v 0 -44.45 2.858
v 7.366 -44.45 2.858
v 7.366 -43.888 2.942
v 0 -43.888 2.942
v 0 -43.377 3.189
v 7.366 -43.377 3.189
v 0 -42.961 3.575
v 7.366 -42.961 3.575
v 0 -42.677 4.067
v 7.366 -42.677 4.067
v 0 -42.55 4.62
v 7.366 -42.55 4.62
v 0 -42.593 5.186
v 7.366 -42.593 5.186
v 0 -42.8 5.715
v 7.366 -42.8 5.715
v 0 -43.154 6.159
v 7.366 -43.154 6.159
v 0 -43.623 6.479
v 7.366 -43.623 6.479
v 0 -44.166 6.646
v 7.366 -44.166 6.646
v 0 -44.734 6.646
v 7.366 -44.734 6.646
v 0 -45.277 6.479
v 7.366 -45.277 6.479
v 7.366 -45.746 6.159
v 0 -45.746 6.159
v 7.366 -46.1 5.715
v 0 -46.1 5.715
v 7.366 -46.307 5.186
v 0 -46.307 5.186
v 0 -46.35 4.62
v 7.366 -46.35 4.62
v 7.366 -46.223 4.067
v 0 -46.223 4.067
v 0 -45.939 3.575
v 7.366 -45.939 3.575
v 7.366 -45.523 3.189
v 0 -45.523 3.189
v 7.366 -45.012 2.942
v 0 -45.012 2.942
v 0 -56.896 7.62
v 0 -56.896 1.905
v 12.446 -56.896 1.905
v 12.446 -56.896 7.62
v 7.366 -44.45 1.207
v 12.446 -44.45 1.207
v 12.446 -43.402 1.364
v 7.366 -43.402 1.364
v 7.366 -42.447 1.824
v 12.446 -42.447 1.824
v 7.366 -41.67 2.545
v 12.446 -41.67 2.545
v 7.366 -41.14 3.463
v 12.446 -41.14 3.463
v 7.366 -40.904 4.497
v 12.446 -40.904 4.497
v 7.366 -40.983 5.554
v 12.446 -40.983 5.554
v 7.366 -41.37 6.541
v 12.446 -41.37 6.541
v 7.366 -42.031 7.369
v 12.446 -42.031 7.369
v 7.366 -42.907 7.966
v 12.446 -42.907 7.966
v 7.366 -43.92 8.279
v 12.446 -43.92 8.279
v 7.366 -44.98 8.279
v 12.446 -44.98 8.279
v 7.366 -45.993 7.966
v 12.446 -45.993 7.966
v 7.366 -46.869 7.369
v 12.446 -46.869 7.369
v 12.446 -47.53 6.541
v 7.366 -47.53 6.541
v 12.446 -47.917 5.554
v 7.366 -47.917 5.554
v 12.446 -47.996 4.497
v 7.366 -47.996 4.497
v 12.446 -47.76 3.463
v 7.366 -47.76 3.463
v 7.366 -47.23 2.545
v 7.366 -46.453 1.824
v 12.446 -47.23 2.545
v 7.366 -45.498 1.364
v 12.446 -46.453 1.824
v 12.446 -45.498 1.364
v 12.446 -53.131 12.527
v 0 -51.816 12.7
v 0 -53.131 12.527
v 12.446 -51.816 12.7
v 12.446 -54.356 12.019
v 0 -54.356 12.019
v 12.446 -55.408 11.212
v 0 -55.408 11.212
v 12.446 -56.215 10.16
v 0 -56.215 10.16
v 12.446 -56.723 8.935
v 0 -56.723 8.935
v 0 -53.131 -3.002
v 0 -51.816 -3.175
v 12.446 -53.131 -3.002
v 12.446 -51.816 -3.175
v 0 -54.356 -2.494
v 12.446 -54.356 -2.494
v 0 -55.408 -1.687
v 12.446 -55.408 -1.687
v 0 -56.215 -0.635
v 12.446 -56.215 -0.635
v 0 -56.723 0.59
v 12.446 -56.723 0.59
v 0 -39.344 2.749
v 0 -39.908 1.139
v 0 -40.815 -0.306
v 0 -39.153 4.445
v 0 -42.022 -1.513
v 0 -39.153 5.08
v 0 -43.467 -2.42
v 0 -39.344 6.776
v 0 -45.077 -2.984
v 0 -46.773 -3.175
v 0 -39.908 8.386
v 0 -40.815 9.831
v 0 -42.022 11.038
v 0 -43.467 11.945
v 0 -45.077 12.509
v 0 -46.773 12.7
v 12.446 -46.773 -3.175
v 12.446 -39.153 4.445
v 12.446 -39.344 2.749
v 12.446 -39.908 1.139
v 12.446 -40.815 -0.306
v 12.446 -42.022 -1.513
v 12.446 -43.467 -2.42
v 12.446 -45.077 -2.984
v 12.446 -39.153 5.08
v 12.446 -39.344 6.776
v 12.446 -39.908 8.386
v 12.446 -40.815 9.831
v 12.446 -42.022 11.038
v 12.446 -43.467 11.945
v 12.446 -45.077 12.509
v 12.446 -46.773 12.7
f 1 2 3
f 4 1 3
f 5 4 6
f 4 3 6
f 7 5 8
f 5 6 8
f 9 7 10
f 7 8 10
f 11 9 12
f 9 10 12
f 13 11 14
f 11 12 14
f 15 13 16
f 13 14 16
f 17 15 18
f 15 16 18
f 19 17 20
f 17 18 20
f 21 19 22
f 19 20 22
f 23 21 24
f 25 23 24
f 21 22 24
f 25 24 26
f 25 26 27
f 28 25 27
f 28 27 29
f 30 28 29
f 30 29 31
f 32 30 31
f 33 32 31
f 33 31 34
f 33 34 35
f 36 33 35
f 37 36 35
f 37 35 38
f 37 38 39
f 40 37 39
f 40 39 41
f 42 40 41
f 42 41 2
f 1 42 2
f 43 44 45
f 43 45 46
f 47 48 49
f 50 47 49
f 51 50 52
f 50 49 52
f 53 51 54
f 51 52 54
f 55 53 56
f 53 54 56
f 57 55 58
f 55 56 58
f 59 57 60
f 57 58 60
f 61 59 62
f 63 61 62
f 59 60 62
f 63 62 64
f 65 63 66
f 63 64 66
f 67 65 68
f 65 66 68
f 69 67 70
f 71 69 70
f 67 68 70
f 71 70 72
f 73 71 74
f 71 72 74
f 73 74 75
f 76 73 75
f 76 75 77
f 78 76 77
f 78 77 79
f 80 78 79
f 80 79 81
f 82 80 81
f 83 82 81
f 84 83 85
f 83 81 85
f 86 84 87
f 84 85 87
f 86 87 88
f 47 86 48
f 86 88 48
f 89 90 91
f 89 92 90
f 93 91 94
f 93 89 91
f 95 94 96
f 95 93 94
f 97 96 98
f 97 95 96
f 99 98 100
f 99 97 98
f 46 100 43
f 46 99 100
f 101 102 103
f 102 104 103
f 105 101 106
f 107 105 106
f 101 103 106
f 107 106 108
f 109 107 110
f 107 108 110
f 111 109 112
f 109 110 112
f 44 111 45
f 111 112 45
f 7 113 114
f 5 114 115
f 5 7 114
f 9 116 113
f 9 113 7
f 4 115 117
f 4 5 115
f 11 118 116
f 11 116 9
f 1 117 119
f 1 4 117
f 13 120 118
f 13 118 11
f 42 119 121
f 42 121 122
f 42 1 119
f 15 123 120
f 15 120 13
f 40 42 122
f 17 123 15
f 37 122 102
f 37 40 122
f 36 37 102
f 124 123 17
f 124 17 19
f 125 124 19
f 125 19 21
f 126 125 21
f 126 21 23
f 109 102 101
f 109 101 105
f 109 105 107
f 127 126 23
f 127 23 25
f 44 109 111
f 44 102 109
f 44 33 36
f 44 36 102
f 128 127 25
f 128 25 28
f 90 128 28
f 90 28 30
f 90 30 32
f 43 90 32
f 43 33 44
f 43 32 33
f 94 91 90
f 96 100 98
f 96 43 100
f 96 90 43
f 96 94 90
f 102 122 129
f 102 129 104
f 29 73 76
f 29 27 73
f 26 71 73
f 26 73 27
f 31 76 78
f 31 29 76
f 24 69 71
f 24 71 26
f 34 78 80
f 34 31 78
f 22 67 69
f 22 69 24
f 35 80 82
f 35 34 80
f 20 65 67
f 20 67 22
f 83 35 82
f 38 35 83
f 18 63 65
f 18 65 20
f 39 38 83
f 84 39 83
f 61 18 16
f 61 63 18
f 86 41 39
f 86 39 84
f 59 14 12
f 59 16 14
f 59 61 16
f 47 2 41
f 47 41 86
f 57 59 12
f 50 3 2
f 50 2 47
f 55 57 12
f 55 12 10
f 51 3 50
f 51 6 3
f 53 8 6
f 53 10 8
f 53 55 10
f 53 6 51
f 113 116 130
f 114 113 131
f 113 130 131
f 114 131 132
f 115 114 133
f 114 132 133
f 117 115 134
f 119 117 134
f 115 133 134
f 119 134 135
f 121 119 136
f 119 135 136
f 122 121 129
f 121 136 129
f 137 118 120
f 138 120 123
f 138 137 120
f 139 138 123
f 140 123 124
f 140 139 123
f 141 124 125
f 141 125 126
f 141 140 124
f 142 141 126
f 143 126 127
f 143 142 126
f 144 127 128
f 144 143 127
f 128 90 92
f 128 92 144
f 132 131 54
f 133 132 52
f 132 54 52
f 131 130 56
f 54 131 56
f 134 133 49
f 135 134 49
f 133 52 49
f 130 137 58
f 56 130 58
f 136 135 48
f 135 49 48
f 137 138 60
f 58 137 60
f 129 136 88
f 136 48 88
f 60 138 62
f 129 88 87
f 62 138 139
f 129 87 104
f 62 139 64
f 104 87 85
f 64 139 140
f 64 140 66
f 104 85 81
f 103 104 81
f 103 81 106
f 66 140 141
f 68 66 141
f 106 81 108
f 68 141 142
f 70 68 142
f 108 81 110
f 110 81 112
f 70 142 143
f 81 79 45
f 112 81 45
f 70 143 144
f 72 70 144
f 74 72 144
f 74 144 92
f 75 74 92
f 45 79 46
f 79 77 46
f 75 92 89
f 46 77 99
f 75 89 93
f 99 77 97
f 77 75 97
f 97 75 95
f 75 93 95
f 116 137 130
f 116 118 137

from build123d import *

# Parameters (mm, degrees)
SKETCH1_W           = 50.8
SKETCH1_H           = 9.525
BOSS_EXTRUDE1_DEPTH = 12.446
SKETCH6_R           = 1.905
CUT_EXTRUDE4_DEPTH  = 12.446
SKETCH7_R           = 3.556
CUT_EXTRUDE5_DEPTH  = 5.08
SKETCH8_W           = 38.1
SKETCH8_H           = 9.525
CUT_EXTRUDE6_DEPTH  = 12.446
FILLET2_R           = 2.54
CUT_EXTRUDE7_START  = -12.446
CUT_EXTRUDE7_DEPTH  = 12.446
FILLET4_R           = 5.08
SKETCH11_W          = 12.446
SKETCH11_H          = 9.525
BOSS_EXTRUDE2_DEPTH = 6.35
CUT_EXTRUDE8_START  = -12.446
SKETCH12_W          = 0.254
SKETCH12_H          = 9.525
CUT_EXTRUDE8_DEPTH  = 12.446
CUT_EXTRUDE9_START  = -12.446
CUT_EXTRUDE9_DEPTH  = 12.446
BOSS_EXTRUDE3_START = -12.446
BOSS_EXTRUDE3_DEPTH = 12.446
FILLET6_R           = 7.62
FILLET7_R           = 5.08


with BuildPart() as part:
    # Sketch1 → Boss-Extrude1 (new body)
    with BuildSketch(Plane.YZ):
        with Locations((-25.4, 4.7625)):
            Rectangle(SKETCH1_W, SKETCH1_H)
    extrude(amount=BOSS_EXTRUDE1_DEPTH)

    # Sketch6 → Cut-Extrude4 (cut)
    with BuildSketch(Plane.YZ.offset(12.446)):
        with Locations(Location((-44.45, 4.7625, 0), (0, 0, 270))):
            Circle(SKETCH6_R)
    extrude(amount=-CUT_EXTRUDE4_DEPTH, mode=Mode.SUBTRACT)

    # Sketch7 → Cut-Extrude5 (cut)
    with BuildSketch(Plane.YZ.offset(12.446)):
        with Locations(Location((-44.45, 4.7625, 0), (0, 0, 270))):
            Circle(SKETCH7_R)
    extrude(amount=-CUT_EXTRUDE5_DEPTH, mode=Mode.SUBTRACT)

    # Sketch8 → Cut-Extrude6 (cut)
    with BuildSketch(Plane.YZ.offset(12.446)):
        with Locations((-19.05, 4.7625)):
            Rectangle(SKETCH8_W, SKETCH8_H)
    extrude(amount=-CUT_EXTRUDE6_DEPTH, mode=Mode.SUBTRACT)

    # Fillet2
    fillet2_edges = [part.edges().sort_by_distance(p)[0] for p in [
        (6.223, -38.1, 0),
        (6.223, -38.1, 9.525),
    ]]
    fillet(fillet2_edges, radius=FILLET2_R)

    # Sketch9 → Cut-Extrude7 (cut)
    with BuildSketch(Plane.YZ.offset(12.446).offset(CUT_EXTRUDE7_START)):
        with BuildLine():
            Line((-40.64, 0), (-38.1, 2.54))
            ThreePointArc((-38.1, 2.54), (-38.843948776, 0.743948776), (-40.64, 0))
        make_face()
        with BuildLine():
            Line((-38.1, 6.985), (-40.64, 9.525))
            ThreePointArc((-40.64, 9.525), (-38.843948776, 8.781051224), (-38.1, 6.985))
        make_face()
    extrude(amount=CUT_EXTRUDE7_DEPTH, mode=Mode.SUBTRACT)

    # Fillet4
    fillet4_edges = [part.edges().sort_by_distance(p)[0] for p in [
        (6.223, -38.1, 2.54),
        (6.223, -38.1, 6.985),
    ]]
    fillet(fillet4_edges, radius=FILLET4_R)

    # Sketch11 → Boss-Extrude2 (add)
    with BuildSketch(Plane.XZ.offset(50.8)):
        with Locations((6.223, 4.7625)):
            Rectangle(SKETCH11_W, SKETCH11_H)
    extrude(amount=BOSS_EXTRUDE2_DEPTH)

    # Sketch12 → Cut-Extrude8 (cut)
    with BuildSketch(Plane.YZ.offset(12.446).offset(CUT_EXTRUDE8_START)):
        with Locations((-57.023, 4.7625)):
            Rectangle(SKETCH12_W, SKETCH12_H)
    extrude(amount=CUT_EXTRUDE8_DEPTH, mode=Mode.SUBTRACT)

    # Sketch13 → Cut-Extrude9 (cut)
    with BuildSketch(Plane.YZ.offset(12.446).offset(CUT_EXTRUDE9_START)):
        with BuildLine():
            Line((-39.153011094, 7.977528923), (-39.153011094, 1.547471077))
            ThreePointArc((-39.153011094, 1.547471077), (-38.370452015, 3.008769732), (-38.1, 4.644204897))
            Line((-38.1, 4.644204897), (-38.1, 4.880795103))
            ThreePointArc((-38.1, 4.880795103), (-38.370452015, 6.516230268), (-39.153011094, 7.977528923))
        make_face()
    extrude(amount=CUT_EXTRUDE9_DEPTH, mode=Mode.SUBTRACT)

    # Sketch14 → Boss-Extrude3 (add)
    with BuildSketch(Plane.YZ.offset(12.446).offset(BOSS_EXTRUDE3_START)):
        with BuildLine():
            Line((-39.153011094, 12.7), (-39.153011094, 7.977528923))
            ThreePointArc((-39.153011094, 7.977528923), (-39.362410998, 8.23227451), (-39.587897552, 8.472897552))
            Line((-39.587897552, 8.472897552), (-40.64, 9.525))
            Line((-40.64, 9.525), (-56.896, 9.525))
            Line((-56.896, 9.525), (-56.896, 12.7))
            Line((-56.896, 12.7), (-40.64, 12.7))
            Line((-40.64, 12.7), (-39.153011094, 12.7))
        make_face()
        with BuildLine():
            Line((-39.153011094, -3.175), (-40.64, -3.175))
            Line((-40.64, -3.175), (-56.896, -3.175))
            Line((-56.896, -3.175), (-56.896, 0))
            Line((-56.896, 0), (-40.64, 0))
            Line((-40.64, 0), (-39.587897552, 1.052102448))
            ThreePointArc((-39.587897552, 1.052102448), (-39.362410998, 1.29272549), (-39.153011094, 1.547471077))
            Line((-39.153011094, 1.547471077), (-39.153011094, -3.175))
        make_face()
    extrude(amount=BOSS_EXTRUDE3_DEPTH)

    # Fillet6
    fillet6_edges = [part.edges().sort_by_distance(p)[0] for p in [
        (6.223, -39.153011094, 12.7),
        (6.223, -39.153011094, -3.175),
    ]]
    fillet(fillet6_edges, radius=FILLET6_R)

    # Fillet7
    fillet7_edges = [part.edges().sort_by_distance(p)[0] for p in [
        (6.223, -56.896, 12.7),
        (6.223, -56.896, -3.175),
    ]]
    fillet(fillet7_edges, radius=FILLET7_R)


solid = part.part
